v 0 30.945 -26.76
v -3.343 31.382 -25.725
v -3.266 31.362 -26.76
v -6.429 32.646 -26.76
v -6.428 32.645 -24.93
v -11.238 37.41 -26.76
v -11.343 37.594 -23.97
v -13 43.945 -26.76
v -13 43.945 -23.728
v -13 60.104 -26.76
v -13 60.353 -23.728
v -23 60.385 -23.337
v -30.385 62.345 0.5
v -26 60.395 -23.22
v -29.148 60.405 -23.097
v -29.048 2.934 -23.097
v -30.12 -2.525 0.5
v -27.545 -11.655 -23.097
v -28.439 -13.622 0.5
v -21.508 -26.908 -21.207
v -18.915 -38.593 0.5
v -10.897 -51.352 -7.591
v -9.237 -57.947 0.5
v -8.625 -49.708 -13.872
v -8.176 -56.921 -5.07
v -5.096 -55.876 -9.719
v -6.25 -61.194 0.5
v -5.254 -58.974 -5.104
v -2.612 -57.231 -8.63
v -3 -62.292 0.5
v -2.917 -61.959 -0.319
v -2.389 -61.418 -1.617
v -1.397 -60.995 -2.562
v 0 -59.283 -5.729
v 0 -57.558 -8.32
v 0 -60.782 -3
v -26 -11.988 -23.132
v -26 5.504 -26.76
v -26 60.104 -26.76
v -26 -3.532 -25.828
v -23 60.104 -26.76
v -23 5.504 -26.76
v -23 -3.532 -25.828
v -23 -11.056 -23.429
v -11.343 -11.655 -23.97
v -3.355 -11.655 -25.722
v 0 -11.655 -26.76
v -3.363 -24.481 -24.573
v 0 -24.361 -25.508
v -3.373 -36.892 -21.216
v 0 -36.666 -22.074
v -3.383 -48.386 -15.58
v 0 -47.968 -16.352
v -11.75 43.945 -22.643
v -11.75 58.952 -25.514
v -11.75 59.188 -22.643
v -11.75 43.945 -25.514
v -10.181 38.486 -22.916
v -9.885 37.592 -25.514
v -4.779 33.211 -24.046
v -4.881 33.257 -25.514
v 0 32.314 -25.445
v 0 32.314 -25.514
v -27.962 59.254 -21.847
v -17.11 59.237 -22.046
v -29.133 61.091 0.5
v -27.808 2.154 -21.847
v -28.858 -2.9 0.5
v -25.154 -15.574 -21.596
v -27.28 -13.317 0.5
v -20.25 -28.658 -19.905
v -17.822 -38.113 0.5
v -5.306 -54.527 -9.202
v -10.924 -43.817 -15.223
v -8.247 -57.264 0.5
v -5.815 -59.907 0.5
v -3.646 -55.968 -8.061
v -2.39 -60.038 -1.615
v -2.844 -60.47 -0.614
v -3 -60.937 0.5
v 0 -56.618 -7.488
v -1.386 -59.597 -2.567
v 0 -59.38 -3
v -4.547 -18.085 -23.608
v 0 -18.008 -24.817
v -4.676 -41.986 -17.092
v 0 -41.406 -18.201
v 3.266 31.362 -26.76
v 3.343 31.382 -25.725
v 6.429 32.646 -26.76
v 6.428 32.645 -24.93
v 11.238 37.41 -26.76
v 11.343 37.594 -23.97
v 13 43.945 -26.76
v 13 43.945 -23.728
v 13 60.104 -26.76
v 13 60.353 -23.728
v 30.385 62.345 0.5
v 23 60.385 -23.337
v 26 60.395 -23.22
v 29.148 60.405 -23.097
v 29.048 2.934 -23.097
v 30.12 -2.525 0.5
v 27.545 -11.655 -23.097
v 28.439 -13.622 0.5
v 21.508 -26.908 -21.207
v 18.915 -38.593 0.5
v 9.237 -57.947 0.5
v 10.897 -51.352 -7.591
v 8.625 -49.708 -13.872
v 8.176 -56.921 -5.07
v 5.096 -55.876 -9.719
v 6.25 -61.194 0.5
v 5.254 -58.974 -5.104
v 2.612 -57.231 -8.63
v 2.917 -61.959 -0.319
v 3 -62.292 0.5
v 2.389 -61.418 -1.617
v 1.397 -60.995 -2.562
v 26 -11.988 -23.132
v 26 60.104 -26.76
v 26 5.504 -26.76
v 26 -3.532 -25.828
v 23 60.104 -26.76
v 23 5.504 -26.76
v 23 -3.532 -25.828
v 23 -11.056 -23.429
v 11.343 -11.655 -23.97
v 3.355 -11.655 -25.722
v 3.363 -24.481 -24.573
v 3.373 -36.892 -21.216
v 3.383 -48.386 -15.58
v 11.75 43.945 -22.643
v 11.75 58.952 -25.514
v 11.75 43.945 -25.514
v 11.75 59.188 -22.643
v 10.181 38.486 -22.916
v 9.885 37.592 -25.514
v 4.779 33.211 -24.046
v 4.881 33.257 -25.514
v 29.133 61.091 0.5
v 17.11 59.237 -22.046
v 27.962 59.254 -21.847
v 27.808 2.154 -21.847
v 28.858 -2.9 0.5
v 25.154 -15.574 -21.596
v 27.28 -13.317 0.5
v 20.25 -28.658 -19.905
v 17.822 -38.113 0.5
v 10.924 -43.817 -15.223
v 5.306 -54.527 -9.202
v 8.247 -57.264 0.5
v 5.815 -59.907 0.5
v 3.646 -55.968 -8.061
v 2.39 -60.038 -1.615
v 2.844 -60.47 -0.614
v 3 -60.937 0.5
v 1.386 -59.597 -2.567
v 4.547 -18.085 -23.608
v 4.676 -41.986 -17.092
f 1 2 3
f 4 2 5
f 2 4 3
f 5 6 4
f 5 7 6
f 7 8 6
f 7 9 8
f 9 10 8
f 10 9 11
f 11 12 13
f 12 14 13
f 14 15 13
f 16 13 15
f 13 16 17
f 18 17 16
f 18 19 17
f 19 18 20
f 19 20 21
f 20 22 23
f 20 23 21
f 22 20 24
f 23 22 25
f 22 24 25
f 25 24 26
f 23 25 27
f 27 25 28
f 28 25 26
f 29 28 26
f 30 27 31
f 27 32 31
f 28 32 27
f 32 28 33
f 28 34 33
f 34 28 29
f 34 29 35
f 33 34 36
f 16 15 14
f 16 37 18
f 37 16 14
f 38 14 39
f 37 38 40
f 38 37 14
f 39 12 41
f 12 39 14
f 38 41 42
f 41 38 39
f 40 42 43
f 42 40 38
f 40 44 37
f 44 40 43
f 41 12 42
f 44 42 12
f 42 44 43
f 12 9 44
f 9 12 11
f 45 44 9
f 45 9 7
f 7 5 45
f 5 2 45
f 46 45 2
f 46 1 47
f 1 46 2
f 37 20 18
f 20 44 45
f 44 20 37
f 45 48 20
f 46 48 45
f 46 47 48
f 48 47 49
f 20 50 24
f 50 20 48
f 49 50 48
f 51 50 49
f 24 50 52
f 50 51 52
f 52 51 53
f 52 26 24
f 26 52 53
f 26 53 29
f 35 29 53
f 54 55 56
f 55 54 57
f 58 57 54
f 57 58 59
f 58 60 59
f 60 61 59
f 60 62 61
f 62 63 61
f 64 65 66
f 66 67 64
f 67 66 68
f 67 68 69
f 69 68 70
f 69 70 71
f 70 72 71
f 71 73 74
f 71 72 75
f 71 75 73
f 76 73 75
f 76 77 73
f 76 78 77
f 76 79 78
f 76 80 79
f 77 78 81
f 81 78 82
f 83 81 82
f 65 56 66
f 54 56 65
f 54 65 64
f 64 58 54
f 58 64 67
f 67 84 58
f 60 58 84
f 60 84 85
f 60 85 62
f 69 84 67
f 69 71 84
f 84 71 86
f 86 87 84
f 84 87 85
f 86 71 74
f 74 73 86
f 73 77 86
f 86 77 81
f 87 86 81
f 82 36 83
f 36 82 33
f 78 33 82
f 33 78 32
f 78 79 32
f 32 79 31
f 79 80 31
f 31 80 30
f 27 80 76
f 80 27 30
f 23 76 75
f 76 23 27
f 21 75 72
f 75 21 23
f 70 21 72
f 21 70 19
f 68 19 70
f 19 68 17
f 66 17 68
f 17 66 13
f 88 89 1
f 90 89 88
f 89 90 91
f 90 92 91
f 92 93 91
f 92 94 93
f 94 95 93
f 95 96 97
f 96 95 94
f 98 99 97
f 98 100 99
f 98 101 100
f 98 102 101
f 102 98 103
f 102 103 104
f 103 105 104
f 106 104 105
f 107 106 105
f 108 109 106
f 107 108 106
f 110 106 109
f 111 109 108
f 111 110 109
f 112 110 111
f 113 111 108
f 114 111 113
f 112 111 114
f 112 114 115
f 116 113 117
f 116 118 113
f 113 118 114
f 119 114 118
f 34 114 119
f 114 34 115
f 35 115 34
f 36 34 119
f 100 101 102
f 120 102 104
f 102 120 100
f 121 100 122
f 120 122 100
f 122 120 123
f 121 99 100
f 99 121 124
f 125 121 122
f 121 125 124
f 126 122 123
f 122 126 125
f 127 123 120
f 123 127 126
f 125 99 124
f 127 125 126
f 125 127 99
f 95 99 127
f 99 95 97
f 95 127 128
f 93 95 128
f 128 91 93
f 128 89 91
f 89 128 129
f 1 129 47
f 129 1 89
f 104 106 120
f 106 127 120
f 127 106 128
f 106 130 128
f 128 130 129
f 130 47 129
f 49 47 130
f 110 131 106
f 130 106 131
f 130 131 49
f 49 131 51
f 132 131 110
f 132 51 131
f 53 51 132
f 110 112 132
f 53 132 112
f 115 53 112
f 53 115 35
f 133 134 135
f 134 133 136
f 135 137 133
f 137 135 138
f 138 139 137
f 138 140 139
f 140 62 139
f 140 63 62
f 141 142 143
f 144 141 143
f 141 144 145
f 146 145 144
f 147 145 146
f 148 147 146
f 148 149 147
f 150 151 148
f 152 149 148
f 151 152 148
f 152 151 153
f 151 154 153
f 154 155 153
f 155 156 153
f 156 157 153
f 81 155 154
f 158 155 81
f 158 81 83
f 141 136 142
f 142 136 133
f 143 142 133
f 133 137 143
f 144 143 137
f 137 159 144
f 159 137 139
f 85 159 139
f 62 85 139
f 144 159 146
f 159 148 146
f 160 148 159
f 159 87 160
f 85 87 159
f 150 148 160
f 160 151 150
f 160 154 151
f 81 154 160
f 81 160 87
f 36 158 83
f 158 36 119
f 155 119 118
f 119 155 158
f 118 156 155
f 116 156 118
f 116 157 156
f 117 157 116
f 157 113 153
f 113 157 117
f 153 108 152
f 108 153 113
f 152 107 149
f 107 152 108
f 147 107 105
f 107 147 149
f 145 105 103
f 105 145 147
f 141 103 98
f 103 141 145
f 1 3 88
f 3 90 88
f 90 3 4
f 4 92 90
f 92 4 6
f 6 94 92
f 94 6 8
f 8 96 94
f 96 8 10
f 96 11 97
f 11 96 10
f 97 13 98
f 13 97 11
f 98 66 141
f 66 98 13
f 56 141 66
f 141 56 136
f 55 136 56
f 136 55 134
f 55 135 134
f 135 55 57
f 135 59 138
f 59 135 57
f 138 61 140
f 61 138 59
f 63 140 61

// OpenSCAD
use <../lib.scad>
use <s/28533s01.scad>
$fa=1; $fs=0.2;
function ldraw_lib__28533(realsolid=false) = [
// 0 Boat Hull Floating 16 x  8 Bottom (Needs Work)
// 0 Name: 28533.dat
// 0 Author: Massimo Maso [Sirio]
// 0 !LDRAW_ORG Part UPDATE 2020-03
// 0 !LICENSE Licensed under CC BY 2.0 and CC BY 4.0 : see CAreadme.txt
// 
// 0 BFC CERTIFY CCW
  [0,"BFC","CERTIFY"],
  [0,"BFC","CCW"],
// 
// 0 !HISTORY 2018-01-28 {LEGO Digital Designer} Original part shape
// 0 !HISTORY 2019-07-18 [Sirio] File preparation for LDraw Parts Tracker
// 0 !HISTORY 2020-12-29 [PTadmin] Official Update 2020-03
// 
// 
// 0 // Needs Work: Optimization of the curved surfaces
// 0 // Needs Work: Possible use of primitives
// 
// 0 // Subparts
// 1 16 0 0 0 1 0 0 0 1 0 0 0 1 s\28533s01.dat
  [1,16,0,0,0,1,0,0,0,1,0,0,0,1, ldraw_lib__s__28533s01(realsolid)],
// 1 16 0 0 0 -1 0 0 0 1 0 0 0 1 s\28533s01.dat
  [1,16,0,0,0,-1,0,0,0,1,0,0,0,1, ldraw_lib__s__28533s01(realsolid)],
// 0 // Outside
// 3 16 0 66.9 77.362 -8.165 66.9 78.405 8.165 66.9 78.405
  [3,16,0,66.9,77.362,-8.165,66.9,78.405,8.165,66.9,78.405],
// 4 16 8.165 66.9 78.405 -8.165 66.9 78.405 -16.073 66.9 81.615 16.073 66.9 81.615
  [4,16,8.165,66.9,78.405,-8.165,66.9,78.405,-16.073,66.9,81.615,16.073,66.9,81.615],
// 4 16 16.073 66.9 81.615 -16.073 66.9 81.615 -28.095 66.9 93.524 28.095 66.9 93.524
  [4,16,16.073,66.9,81.615,-16.073,66.9,81.615,-28.095,66.9,93.524,28.095,66.9,93.524],
// 4 16 28.095 66.9 93.524 -28.095 66.9 93.524 -32.5 66.9 109.862 32.5 66.9 109.862
  [4,16,28.095,66.9,93.524,-28.095,66.9,93.524,-32.5,66.9,109.862,32.5,66.9,109.862],
// 4 16 32.5 66.9 109.862 -32.5 66.9 109.862 -32.5 66.9 150.259 32.5 66.9 150.259
  [4,16,32.5,66.9,109.862,-32.5,66.9,109.862,-32.5,66.9,150.259,32.5,66.9,150.259],
// 4 16 32.5 66.9 150.259 -32.5 66.9 150.259 -32.5 59.321 150.883 32.5 59.321 150.883
  [4,16,32.5,66.9,150.259,-32.5,66.9,150.259,-32.5,59.321,150.883,32.5,59.321,150.883],
// 4 16 32.5 59.321 150.883 -32.5 59.321 150.883 -75.963 -1.25 155.863 75.963 -1.25 155.863
  [4,16,32.5,59.321,150.883,-32.5,59.321,150.883,-75.963,-1.25,155.863,75.963,-1.25,155.863],
// 4 16 75.963 -1.25 155.863 -75.963 -1.25 155.863 -72.833 -1.25 152.727 72.833 -1.25 152.727
  [4,16,75.963,-1.25,155.863,-75.963,-1.25,155.863,-72.833,-1.25,152.727,72.833,-1.25,152.727],
// 0 // Inside
// 4 16 -72.833 -1.25 152.727 -29.375 56.608 147.97 29.375 56.608 147.97 72.833 -1.25 152.727
  [4,16,-72.833,-1.25,152.727,-29.375,56.608,147.97,29.375,56.608,147.97,72.833,-1.25,152.727],
// 4 16 -29.375 56.608 147.97 -29.375 63.785 147.38 29.375 63.785 147.38 29.375 56.608 147.97
  [4,16,-29.375,56.608,147.97,-29.375,63.785,147.38,29.375,63.785,147.38,29.375,56.608,147.97],
// 4 16 -29.375 63.785 147.38 -29.375 63.785 109.862 29.375 63.785 109.862 29.375 63.785 147.38
  [4,16,-29.375,63.785,147.38,-29.375,63.785,109.862,29.375,63.785,109.862,29.375,63.785,147.38],
// 4 16 -29.375 63.785 109.862 -24.712 63.785 93.981 24.712 63.785 93.981 29.375 63.785 109.862
  [4,16,-29.375,63.785,109.862,-24.712,63.785,93.981,24.712,63.785,93.981,29.375,63.785,109.862],
// 4 16 -24.712 63.785 93.981 -12.203 63.785 83.142 12.203 63.785 83.142 24.712 63.785 93.981
  [4,16,-24.712,63.785,93.981,-12.203,63.785,83.142,12.203,63.785,83.142,24.712,63.785,93.981],
// 3 16 0 63.785 80.786 12.203 63.785 83.142 -12.203 63.785 83.142
  [3,16,0,63.785,80.786,12.203,63.785,83.142,-12.203,63.785,83.142],
// 0 // Edges
// 2 24 -32.5 66.9 150.259 32.5 66.9 150.259
  [2,24,-32.5,66.9,150.259,32.5,66.9,150.259],
// 2 24 -29.375 63.785 147.38 29.375 63.785 147.38
  [2,24,-29.375,63.785,147.38,29.375,63.785,147.38],
// 2 24 -75.963 -1.25 155.863 75.963 -1.25 155.863
  [2,24,-75.963,-1.25,155.863,75.963,-1.25,155.863],
// 2 24 72.833 -1.25 152.727 -72.833 -1.25 152.727
  [2,24,72.833,-1.25,152.727,-72.833,-1.25,152.727],
// 0 // Conditional lines on simmetry plane
// 5 24 0 66.9 77.362 0 66.9 -29.137 8.388 64.304 -29.137 -8.388 64.304 -29.137
  [5,24,0,66.9,77.362,0,66.9,-29.137,8.388,64.304,-29.137,-8.388,64.304,-29.137],
// 5 24 0 66.9 -29.137 0 63.77 -60.903 8.408 61.433 -61.203 -8.408 61.433 -61.203
  [5,24,0,66.9,-29.137,0,63.77,-60.903,8.408,61.433,-61.203,-8.408,61.433,-61.203],
// 5 24 0 63.77 -60.903 0 55.184 -91.664 8.432 53.041 -92.229 -8.432 53.041 -92.229
  [5,24,0,63.77,-60.903,0,55.184,-91.664,8.432,53.041,-92.229,-8.432,53.041,-92.229],
// 5 24 0 55.184 -91.664 0 40.881 -119.921 8.458 38.95 -120.964 -8.458 38.95 -120.964
  [5,24,0,55.184,-91.664,0,40.881,-119.921,8.458,38.95,-120.964,-8.458,38.95,-120.964],
// 5 24 0 40.881 -119.921 0 20.801 -143.896 6.53 21.574 -143.078 -6.53 21.574 -143.078
  [5,24,0,40.881,-119.921,0,20.801,-143.896,6.53,21.574,-143.078,-6.53,21.574,-143.078],
// 5 24 0 20.801 -143.896 0 14.322 -148.207 6.53 21.574 -143.078 -6.53 21.574 -143.078
  [5,24,0,20.801,-143.896,0,14.322,-148.207,6.53,21.574,-143.078,-6.53,21.574,-143.078],
// 5 24 0 14.322 -148.207 0 7.5 -151.956 3.492 6.405 -152.487 -3.492 6.405 -152.487
  [5,24,0,14.322,-148.207,0,7.5,-151.956,3.492,6.405,-152.487,-3.492,6.405,-152.487],
// 5 24 0 7.5 -151.956 0 7.5 -148.449 3.492 6.405 -152.487 -3.492 6.405 -152.487
  [5,24,0,7.5,-151.956,0,7.5,-148.449,3.492,6.405,-152.487,-3.492,6.405,-152.487],
// 5 24 0 7.5 -148.449 0 18.72 -141.546 3.464 6.418 -148.993 -3.464 6.418 -148.993
  [5,24,0,7.5,-148.449,0,18.72,-141.546,3.464,6.418,-148.993,-3.464,6.418,-148.993],
// 5 24 0 18.72 -141.546 0 45.502 -103.514 11.689 42.729 -104.966 -11.689 42.729 -104.966
  [5,24,0,18.72,-141.546,0,45.502,-103.514,11.689,42.729,-104.966,-11.689,42.729,-104.966],
// 5 24 0 45.502 -103.514 0 62.042 -45.021 11.368 59.019 -45.213 -11.368 59.019 -45.213
  [5,24,0,45.502,-103.514,0,62.042,-45.021,11.368,59.019,-45.213,-11.368,59.019,-45.213],
// 5 24 0 62.042 -45.021 0 63.613 80.786 -11.948 60.114 83.027 11.948 60.114 83.027
  [5,24,0,62.042,-45.021,0,63.613,80.786,-11.948,60.114,83.027,11.948,60.114,83.027],
// 5 24 0 63.613 80.786 0 63.785 80.786 -12.203 63.785 83.142 12.203 63.785 83.142
  [5,24,0,63.613,80.786,0,63.785,80.786,-12.203,63.785,83.142,12.203,63.785,83.142],
];
module ldraw_lib__28533(step=0, col=false, unit=2/5, alt=false, line=0.2, solid=!$preview)
    makepoly(ldraw_lib__28533(solid), step=step, col=col, unit=unit, alt=alt, line=line, solid=solid);
ldraw_lib__28533(line=0.2);
